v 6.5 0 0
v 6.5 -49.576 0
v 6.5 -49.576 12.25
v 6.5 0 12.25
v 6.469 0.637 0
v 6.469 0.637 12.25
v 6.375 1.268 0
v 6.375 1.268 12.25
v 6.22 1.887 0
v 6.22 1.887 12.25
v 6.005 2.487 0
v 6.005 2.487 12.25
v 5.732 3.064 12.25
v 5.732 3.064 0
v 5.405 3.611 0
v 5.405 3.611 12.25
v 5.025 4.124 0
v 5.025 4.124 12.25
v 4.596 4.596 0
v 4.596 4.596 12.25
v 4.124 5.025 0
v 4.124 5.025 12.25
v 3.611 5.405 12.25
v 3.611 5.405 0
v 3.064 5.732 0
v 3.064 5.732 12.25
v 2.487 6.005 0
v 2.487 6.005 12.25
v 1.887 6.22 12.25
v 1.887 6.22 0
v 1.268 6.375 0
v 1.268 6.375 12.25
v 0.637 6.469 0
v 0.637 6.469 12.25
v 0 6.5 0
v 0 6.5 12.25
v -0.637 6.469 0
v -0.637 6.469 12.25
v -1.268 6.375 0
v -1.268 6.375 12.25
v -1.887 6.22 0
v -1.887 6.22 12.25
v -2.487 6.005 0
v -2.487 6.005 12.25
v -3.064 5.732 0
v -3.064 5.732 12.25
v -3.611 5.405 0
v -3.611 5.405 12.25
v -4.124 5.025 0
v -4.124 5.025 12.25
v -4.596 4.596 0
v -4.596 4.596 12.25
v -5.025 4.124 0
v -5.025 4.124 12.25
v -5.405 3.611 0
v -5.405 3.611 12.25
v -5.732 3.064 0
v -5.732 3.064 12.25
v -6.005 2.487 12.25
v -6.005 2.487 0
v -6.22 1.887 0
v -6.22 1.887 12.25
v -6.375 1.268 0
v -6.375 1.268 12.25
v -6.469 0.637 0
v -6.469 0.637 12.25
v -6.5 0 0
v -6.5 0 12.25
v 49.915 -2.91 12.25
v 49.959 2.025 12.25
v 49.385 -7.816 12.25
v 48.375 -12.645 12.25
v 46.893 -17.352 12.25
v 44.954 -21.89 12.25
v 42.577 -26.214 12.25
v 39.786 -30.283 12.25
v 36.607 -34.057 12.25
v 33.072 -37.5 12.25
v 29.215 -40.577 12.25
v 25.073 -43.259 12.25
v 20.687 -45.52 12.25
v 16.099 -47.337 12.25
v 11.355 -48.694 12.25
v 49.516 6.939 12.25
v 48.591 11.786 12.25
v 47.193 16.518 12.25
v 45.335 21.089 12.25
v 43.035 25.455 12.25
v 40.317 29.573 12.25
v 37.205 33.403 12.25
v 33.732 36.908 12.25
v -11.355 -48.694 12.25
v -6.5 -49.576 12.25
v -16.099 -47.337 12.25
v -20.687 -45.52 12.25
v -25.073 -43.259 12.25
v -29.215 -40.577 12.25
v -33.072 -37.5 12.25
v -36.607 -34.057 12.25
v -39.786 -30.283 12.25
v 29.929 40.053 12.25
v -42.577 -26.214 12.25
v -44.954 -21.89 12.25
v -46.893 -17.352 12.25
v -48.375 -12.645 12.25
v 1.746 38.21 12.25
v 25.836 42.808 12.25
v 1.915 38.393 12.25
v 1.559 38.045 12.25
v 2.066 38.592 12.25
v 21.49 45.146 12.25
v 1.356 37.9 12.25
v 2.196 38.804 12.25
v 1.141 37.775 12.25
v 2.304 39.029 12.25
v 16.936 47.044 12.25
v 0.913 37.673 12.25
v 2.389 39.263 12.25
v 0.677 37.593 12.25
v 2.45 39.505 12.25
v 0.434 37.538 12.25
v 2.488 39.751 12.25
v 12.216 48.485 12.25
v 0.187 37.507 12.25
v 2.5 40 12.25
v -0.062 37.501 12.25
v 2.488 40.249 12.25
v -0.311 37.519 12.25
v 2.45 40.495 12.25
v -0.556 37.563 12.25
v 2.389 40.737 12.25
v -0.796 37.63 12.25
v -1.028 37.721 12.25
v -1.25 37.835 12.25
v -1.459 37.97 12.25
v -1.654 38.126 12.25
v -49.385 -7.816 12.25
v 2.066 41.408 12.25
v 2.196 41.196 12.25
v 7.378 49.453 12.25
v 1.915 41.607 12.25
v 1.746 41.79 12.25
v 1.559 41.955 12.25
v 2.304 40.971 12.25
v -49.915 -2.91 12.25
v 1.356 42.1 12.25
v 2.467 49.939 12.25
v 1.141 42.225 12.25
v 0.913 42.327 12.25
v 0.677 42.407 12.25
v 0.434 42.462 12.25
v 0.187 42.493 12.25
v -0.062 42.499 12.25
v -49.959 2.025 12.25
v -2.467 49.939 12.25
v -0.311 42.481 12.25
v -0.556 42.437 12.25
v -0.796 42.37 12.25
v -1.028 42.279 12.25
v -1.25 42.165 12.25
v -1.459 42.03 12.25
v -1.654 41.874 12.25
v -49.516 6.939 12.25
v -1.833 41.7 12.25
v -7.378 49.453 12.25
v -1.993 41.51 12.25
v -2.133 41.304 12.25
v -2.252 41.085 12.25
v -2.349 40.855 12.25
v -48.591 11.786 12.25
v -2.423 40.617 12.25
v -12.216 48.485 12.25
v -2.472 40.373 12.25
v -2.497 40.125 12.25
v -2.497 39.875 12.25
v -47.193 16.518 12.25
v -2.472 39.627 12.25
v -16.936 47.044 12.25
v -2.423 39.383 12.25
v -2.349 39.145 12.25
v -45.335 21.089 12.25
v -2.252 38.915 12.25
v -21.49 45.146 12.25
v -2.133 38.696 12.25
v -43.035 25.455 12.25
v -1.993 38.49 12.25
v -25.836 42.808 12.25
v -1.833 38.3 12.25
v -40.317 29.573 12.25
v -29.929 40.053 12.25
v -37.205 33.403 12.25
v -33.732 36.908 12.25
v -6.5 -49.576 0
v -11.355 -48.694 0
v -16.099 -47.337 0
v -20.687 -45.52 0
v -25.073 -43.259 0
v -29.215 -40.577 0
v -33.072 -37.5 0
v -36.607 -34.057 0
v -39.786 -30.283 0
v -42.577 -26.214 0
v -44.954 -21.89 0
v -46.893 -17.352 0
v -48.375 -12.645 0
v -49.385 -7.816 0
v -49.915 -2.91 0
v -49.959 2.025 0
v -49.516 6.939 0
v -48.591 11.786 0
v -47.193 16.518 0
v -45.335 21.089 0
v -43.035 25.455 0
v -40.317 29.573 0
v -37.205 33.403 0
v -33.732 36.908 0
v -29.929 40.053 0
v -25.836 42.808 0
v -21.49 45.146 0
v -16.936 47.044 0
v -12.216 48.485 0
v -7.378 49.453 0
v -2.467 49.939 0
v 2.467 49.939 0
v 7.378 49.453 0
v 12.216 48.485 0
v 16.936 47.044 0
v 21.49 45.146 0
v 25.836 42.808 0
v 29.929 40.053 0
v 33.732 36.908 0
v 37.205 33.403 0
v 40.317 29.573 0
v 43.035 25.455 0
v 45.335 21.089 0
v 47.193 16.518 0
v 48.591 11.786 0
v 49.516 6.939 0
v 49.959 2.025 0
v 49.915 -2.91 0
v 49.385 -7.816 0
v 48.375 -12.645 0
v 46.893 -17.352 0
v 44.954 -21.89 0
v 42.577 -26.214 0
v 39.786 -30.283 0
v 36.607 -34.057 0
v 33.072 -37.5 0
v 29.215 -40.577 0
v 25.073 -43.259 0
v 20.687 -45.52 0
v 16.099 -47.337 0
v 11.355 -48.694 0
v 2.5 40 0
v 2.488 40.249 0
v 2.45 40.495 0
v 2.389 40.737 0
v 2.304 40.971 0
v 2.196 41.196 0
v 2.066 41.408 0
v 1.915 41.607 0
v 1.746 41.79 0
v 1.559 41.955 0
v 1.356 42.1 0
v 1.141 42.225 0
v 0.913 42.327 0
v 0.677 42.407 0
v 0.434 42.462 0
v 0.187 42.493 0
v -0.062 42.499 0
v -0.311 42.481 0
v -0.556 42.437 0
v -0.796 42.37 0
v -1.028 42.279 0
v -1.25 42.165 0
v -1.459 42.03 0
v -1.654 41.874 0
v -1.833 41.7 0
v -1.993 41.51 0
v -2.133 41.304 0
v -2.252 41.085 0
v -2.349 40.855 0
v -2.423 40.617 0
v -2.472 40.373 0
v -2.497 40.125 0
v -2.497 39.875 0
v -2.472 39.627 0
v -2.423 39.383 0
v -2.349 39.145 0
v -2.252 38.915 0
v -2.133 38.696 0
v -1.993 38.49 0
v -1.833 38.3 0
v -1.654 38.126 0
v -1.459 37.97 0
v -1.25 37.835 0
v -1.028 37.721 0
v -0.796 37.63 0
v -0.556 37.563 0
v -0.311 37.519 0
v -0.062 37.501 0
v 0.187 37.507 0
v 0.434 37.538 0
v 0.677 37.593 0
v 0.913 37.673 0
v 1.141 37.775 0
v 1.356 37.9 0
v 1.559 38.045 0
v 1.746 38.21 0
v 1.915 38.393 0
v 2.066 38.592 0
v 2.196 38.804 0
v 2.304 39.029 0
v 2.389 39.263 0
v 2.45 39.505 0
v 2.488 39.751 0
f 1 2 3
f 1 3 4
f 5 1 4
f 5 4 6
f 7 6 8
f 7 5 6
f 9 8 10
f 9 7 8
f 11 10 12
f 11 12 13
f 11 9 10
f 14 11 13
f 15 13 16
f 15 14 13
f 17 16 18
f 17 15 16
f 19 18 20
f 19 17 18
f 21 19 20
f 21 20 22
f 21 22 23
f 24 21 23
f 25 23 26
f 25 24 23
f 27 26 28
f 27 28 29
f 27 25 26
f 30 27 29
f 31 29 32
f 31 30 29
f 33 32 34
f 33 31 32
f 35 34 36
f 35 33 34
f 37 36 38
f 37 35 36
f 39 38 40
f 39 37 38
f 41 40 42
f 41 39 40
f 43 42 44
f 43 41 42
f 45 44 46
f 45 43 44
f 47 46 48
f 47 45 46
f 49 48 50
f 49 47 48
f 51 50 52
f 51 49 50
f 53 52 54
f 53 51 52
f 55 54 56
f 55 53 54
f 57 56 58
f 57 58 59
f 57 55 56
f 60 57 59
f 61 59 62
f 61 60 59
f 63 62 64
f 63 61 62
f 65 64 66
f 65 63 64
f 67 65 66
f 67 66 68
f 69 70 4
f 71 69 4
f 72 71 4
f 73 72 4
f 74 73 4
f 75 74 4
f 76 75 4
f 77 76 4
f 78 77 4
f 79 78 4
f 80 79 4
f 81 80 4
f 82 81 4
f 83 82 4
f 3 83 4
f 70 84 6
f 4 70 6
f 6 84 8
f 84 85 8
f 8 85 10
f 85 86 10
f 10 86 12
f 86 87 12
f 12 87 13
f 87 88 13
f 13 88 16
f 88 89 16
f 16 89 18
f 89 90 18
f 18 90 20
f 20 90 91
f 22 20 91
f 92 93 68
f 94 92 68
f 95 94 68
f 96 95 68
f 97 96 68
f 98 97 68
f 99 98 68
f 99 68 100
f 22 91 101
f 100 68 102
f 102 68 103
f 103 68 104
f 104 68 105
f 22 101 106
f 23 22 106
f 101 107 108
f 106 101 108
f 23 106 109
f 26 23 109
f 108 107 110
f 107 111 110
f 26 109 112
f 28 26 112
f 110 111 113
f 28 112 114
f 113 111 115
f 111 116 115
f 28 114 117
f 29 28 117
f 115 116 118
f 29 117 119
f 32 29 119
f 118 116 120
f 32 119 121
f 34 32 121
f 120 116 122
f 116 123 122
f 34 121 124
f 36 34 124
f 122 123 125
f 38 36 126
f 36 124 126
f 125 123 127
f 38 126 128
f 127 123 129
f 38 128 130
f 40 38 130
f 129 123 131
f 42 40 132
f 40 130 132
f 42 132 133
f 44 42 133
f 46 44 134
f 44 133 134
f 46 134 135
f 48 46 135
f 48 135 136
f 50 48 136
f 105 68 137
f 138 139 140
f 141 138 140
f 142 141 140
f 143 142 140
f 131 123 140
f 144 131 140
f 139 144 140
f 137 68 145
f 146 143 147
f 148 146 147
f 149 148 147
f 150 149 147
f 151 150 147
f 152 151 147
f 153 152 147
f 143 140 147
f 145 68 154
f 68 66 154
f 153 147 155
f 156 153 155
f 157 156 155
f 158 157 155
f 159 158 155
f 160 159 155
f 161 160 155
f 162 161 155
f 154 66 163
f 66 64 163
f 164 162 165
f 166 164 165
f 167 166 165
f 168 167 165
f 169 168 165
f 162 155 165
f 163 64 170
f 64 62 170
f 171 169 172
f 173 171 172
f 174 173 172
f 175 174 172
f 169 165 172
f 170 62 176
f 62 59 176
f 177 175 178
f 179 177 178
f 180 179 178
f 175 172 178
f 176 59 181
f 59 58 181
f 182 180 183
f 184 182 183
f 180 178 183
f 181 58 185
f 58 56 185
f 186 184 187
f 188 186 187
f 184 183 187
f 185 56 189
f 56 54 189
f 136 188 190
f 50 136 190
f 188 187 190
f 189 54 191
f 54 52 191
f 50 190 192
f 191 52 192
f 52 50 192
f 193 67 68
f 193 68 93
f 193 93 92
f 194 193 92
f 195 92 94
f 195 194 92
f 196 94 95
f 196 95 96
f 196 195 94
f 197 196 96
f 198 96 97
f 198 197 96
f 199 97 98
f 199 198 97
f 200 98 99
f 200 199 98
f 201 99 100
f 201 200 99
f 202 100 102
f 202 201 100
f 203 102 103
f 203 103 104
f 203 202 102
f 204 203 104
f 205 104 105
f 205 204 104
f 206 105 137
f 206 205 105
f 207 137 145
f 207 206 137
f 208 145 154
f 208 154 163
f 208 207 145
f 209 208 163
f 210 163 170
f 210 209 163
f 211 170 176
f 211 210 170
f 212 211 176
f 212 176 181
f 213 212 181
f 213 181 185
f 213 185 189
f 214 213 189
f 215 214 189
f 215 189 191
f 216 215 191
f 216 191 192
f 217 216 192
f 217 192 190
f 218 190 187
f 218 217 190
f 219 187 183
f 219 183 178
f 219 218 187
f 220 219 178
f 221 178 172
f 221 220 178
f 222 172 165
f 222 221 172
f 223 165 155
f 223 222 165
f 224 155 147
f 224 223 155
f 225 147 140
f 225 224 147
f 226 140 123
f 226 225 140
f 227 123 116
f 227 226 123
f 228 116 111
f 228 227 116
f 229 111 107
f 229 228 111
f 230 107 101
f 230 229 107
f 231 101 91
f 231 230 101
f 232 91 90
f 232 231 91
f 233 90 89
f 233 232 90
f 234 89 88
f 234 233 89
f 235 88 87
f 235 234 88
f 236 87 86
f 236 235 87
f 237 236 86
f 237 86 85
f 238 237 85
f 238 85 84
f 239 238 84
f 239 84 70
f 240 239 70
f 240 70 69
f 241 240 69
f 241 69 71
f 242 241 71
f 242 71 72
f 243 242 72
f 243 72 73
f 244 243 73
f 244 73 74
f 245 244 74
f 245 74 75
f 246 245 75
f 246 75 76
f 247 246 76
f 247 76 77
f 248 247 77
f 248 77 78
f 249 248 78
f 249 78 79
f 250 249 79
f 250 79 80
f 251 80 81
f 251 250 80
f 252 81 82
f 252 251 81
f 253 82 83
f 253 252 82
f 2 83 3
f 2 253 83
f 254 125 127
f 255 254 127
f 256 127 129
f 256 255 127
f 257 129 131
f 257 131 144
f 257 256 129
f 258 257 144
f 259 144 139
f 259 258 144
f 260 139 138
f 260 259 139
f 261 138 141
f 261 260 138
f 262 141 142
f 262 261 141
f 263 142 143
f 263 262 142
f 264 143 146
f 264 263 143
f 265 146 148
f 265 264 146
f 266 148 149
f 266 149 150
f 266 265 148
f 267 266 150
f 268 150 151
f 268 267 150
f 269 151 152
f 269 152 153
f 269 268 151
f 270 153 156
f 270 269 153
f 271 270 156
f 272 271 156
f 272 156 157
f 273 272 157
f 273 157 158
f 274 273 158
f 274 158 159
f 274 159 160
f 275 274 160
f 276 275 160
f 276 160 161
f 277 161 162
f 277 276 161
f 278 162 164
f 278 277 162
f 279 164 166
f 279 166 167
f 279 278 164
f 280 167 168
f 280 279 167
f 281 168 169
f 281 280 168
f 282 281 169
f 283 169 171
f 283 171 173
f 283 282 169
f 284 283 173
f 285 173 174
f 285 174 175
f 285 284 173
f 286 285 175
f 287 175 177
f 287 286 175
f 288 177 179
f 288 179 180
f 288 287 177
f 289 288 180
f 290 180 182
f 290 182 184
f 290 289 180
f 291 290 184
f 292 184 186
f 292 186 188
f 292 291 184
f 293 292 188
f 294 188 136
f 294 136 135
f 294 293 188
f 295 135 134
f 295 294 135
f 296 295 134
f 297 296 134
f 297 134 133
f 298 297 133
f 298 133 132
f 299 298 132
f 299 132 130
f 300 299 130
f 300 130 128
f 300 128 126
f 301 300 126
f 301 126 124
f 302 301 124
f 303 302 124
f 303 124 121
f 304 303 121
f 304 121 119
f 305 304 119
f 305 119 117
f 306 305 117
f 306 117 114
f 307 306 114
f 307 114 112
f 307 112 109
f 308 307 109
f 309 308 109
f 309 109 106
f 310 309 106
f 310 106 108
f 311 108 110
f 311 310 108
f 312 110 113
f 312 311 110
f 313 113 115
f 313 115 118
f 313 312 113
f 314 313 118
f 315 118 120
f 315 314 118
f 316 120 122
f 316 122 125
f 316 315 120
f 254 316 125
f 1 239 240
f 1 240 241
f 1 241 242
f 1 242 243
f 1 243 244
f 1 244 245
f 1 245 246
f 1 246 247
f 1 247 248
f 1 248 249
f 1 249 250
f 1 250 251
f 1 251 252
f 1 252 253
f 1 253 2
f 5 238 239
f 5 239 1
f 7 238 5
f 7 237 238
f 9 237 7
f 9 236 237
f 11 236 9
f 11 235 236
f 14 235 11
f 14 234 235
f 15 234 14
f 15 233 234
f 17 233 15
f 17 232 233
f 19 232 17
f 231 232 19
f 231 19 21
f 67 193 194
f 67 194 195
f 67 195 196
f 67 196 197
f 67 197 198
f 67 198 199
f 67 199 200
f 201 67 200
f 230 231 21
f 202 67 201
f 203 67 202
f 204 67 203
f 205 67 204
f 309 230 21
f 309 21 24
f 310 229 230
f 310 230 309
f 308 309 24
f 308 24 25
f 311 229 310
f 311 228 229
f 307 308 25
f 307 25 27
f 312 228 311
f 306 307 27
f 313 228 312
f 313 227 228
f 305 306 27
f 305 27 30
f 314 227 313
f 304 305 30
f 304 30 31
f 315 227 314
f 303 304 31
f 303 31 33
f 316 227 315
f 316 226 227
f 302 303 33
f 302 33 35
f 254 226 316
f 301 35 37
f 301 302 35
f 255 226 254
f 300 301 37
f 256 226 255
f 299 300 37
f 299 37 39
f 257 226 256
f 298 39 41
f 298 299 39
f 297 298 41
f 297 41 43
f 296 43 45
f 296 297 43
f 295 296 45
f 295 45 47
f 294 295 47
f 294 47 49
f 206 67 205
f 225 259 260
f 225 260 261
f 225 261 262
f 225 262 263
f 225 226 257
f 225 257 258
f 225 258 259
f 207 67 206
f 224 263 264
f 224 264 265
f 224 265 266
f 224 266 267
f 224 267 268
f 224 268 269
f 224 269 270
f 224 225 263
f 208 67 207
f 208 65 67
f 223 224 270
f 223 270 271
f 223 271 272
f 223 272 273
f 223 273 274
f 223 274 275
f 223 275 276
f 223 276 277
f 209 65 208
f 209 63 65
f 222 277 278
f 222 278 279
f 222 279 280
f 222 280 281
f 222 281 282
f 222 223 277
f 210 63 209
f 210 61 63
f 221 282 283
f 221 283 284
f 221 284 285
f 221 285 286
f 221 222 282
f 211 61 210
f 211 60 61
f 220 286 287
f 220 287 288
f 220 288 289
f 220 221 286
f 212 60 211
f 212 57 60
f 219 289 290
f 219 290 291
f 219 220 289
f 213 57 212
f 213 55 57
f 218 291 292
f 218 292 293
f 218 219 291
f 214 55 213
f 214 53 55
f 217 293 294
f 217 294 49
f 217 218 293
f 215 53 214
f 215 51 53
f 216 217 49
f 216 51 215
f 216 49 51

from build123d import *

# Parameters (mm, degrees)
ESQUISSE1_R          = 2.5
BASE_EXTRUSION_DEPTH = 12.25


with BuildPart() as part:
    # Esquisse1 → Base-Extrusion (new body)
    with BuildSketch(Plane.XY):
        with BuildLine():
            Line((-6.5, 0), (-6.5, -49.575699692))
            ThreePointArc((-6.5, -49.575699692), (0, 50), (6.5, -49.575699692))
            Line((6.5, -49.575699692), (6.5, 0))
            ThreePointArc((6.5, 0), (0, 6.5), (-6.5, 0))
        make_face()
        with Locations((0, 40)):
            Circle(ESQUISSE1_R, mode=Mode.SUBTRACT)
    extrude(amount=BASE_EXTRUSION_DEPTH)


solid = part.part
